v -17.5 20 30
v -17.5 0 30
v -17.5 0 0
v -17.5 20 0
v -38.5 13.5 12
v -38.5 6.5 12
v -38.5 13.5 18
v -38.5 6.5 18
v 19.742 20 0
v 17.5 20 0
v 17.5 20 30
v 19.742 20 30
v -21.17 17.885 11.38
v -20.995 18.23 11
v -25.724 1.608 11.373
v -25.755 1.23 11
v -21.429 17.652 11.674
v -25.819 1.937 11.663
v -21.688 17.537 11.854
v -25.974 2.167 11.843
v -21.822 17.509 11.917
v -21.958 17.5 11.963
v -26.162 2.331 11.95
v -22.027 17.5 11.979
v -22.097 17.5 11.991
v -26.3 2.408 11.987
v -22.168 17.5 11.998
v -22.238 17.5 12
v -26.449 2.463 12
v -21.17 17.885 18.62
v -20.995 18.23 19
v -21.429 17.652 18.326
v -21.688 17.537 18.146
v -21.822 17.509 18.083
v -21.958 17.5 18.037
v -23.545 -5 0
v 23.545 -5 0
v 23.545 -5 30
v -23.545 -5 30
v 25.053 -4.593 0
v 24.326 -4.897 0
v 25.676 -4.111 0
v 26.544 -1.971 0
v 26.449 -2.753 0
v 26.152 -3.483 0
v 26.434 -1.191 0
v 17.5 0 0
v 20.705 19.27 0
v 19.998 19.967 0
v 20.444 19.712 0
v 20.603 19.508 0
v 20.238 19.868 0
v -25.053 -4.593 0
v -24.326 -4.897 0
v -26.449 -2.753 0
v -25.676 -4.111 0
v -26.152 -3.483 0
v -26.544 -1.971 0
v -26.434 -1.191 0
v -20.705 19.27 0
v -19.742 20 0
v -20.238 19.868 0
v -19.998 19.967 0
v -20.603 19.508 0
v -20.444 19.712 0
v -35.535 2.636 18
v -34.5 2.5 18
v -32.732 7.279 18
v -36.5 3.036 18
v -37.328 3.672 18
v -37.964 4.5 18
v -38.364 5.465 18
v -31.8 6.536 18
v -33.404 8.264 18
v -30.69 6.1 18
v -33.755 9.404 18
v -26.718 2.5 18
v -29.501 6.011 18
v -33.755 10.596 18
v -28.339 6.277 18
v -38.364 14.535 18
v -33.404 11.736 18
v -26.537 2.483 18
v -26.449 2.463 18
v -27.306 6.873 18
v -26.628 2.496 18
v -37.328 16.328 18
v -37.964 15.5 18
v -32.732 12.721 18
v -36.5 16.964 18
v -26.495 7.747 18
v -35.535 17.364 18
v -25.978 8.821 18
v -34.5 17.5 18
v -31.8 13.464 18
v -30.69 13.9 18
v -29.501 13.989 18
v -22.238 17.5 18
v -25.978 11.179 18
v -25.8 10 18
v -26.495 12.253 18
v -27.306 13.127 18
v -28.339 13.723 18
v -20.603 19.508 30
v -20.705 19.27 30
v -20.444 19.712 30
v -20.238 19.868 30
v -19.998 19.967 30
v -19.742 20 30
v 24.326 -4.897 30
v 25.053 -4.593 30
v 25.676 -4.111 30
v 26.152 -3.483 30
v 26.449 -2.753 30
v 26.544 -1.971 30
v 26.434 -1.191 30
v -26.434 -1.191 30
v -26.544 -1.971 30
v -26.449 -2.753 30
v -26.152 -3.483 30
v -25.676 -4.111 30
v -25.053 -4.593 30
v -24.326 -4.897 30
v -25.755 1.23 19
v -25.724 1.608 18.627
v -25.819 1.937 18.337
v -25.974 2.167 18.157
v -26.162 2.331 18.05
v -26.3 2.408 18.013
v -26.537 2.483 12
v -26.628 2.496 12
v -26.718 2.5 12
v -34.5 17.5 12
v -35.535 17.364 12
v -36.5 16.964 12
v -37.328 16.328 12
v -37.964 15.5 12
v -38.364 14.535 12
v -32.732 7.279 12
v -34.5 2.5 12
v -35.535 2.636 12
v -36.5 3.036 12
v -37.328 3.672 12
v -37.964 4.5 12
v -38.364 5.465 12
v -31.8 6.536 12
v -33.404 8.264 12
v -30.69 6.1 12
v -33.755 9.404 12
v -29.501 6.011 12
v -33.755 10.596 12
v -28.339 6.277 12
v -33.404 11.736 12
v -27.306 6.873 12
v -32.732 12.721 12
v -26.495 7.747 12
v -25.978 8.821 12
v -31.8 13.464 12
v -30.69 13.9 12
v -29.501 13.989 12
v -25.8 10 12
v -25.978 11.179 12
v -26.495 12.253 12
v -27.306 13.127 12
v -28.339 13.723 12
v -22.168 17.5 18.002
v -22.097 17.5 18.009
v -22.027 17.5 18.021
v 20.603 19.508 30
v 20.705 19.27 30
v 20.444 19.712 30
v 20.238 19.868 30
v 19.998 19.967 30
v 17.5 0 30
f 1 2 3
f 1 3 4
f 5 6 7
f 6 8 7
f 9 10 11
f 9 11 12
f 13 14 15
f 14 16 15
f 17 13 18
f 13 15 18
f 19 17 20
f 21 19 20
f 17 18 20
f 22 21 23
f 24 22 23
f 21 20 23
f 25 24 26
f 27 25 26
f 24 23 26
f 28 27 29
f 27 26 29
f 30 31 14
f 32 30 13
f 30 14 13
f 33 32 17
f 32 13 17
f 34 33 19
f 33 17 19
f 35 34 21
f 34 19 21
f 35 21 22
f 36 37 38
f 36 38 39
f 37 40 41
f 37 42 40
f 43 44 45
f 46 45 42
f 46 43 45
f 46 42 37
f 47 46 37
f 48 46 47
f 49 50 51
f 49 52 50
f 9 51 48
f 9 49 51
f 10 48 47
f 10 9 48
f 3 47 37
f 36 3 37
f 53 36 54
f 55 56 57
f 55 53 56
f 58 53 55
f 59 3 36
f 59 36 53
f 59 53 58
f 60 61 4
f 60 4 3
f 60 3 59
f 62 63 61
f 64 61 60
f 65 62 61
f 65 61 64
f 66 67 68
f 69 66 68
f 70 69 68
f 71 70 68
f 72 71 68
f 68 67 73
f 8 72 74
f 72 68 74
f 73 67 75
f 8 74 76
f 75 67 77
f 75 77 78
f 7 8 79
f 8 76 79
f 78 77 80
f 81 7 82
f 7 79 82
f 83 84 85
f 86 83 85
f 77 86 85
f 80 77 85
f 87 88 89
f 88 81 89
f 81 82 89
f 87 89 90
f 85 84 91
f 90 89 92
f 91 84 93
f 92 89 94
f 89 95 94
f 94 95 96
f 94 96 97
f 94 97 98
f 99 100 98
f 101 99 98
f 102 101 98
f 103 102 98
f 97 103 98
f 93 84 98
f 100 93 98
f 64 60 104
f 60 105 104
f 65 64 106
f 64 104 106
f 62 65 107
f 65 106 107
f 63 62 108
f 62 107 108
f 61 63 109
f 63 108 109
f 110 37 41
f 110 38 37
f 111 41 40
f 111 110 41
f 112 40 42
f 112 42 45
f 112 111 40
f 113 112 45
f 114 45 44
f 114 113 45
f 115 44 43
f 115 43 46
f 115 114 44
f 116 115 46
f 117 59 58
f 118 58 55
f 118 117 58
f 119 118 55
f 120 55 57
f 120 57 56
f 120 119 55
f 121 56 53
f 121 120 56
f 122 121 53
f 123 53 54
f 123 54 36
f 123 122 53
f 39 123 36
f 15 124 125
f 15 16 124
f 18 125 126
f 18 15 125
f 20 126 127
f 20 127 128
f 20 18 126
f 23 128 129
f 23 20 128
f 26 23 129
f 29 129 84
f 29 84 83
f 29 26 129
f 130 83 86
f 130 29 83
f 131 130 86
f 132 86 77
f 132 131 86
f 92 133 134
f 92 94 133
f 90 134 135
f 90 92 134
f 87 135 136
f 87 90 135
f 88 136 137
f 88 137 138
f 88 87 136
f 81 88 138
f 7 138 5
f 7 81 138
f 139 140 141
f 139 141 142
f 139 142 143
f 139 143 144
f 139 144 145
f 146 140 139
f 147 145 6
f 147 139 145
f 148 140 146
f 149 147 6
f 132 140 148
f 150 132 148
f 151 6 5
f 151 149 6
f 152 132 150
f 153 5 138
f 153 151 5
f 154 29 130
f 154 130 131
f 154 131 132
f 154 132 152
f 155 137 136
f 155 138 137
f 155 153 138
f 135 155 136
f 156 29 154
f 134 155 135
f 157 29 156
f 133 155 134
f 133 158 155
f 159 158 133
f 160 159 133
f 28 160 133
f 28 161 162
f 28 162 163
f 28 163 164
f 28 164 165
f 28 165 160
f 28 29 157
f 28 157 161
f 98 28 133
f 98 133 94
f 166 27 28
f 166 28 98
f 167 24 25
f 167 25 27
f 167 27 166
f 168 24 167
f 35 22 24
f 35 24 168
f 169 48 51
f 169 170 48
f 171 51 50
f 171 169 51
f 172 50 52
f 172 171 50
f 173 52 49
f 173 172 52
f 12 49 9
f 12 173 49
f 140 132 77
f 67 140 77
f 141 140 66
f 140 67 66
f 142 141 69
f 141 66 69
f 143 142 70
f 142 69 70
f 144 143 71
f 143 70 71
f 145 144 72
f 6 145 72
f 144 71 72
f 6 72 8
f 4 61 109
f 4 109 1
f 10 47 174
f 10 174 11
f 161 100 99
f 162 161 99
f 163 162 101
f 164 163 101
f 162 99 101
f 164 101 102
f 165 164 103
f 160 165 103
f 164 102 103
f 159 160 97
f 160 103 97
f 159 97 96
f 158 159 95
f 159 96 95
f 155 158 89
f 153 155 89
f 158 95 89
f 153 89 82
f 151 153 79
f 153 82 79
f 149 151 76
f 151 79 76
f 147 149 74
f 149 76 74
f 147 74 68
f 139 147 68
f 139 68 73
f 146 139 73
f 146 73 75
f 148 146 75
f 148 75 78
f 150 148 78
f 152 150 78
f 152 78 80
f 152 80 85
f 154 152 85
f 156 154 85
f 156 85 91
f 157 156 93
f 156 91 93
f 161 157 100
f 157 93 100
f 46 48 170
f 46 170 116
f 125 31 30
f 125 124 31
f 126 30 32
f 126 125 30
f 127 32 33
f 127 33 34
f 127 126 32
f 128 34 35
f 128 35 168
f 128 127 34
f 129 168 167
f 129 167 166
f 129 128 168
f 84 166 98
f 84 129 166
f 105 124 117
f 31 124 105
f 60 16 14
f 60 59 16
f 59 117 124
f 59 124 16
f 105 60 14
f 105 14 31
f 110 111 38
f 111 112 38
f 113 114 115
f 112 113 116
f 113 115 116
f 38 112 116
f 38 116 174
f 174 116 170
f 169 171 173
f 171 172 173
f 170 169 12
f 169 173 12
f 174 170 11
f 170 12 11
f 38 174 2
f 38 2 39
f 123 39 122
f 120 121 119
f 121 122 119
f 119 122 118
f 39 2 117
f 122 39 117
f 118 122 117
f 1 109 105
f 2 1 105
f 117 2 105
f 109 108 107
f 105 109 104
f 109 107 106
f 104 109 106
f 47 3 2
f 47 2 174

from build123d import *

# Parameters (mm, degrees)
PAD_DEPTH    = 30
SKETCH001_W  = 15
SKETCH001_H  = 6
PAD001_DEPTH = 21
SKETCH002_R  = 4
POCKET_DEPTH = 6
FILLET_R     = 4
FILLET001_R  = 3
FILLET002_R  = 1
FILLET003_R  = 1


with BuildPart() as part:
    # Sketch → Pad (new body)
    with BuildSketch(Plane.XY):
        Polygon((-17.5, 20), (-17.5, 0), (17.5, 0), (17.5, 20), (20.5, 20), (27.5, -5), (-27.5, -5), (-20.5, 20), align=None)
    extrude(amount=PAD_DEPTH)

    # Sketch001 (on Face1 of Pad) → Pad001 (join)
    with BuildSketch(Plane.YZ.offset(-17.5)):
        with Locations((10, 15)):
            Rectangle(SKETCH001_W, SKETCH001_H)
    extrude(amount=-PAD001_DEPTH)

    # Sketch002 (on Face15 of Pad001) → Pocket (cut)
    with BuildSketch(Plane.XY.offset(18)):
        with Locations((-29.8, 10)):
            Circle(SKETCH002_R)
    extrude(amount=-POCKET_DEPTH, mode=Mode.SUBTRACT)

    # Fillet
    fillet_edges = [part.edges().sort_by_distance(p)[0] for p in [
        (-38.5, 17.5, 15),
        (-38.5, 2.5, 15),
    ]]
    fillet(fillet_edges, radius=FILLET_R)

    # Fillet001
    fillet001_edges = [part.edges().sort_by_distance(p)[0] for p in [
        (-27.5, -5, 15),
        (27.5, -5, 15),
    ]]
    fillet(fillet001_edges, radius=FILLET001_R)

    # Fillet002
    fillet002_edges = [part.edges().sort_by_distance(p)[0] for p in [
        (-20.5, 20, 15),
        (20.5, 20, 15),
    ]]
    fillet(fillet002_edges, radius=FILLET002_R)

    # Fillet003
    fillet003_edges = [part.edges().sort_by_distance(p)[0] for p in [
        (-23.3, 10, 18),
        (-23.3, 10, 12),
        (-21.2, 17.5, 15),
        (-25.4, 2.5, 15),
    ]]
    fillet(fillet003_edges, radius=FILLET003_R)


solid = part.part
